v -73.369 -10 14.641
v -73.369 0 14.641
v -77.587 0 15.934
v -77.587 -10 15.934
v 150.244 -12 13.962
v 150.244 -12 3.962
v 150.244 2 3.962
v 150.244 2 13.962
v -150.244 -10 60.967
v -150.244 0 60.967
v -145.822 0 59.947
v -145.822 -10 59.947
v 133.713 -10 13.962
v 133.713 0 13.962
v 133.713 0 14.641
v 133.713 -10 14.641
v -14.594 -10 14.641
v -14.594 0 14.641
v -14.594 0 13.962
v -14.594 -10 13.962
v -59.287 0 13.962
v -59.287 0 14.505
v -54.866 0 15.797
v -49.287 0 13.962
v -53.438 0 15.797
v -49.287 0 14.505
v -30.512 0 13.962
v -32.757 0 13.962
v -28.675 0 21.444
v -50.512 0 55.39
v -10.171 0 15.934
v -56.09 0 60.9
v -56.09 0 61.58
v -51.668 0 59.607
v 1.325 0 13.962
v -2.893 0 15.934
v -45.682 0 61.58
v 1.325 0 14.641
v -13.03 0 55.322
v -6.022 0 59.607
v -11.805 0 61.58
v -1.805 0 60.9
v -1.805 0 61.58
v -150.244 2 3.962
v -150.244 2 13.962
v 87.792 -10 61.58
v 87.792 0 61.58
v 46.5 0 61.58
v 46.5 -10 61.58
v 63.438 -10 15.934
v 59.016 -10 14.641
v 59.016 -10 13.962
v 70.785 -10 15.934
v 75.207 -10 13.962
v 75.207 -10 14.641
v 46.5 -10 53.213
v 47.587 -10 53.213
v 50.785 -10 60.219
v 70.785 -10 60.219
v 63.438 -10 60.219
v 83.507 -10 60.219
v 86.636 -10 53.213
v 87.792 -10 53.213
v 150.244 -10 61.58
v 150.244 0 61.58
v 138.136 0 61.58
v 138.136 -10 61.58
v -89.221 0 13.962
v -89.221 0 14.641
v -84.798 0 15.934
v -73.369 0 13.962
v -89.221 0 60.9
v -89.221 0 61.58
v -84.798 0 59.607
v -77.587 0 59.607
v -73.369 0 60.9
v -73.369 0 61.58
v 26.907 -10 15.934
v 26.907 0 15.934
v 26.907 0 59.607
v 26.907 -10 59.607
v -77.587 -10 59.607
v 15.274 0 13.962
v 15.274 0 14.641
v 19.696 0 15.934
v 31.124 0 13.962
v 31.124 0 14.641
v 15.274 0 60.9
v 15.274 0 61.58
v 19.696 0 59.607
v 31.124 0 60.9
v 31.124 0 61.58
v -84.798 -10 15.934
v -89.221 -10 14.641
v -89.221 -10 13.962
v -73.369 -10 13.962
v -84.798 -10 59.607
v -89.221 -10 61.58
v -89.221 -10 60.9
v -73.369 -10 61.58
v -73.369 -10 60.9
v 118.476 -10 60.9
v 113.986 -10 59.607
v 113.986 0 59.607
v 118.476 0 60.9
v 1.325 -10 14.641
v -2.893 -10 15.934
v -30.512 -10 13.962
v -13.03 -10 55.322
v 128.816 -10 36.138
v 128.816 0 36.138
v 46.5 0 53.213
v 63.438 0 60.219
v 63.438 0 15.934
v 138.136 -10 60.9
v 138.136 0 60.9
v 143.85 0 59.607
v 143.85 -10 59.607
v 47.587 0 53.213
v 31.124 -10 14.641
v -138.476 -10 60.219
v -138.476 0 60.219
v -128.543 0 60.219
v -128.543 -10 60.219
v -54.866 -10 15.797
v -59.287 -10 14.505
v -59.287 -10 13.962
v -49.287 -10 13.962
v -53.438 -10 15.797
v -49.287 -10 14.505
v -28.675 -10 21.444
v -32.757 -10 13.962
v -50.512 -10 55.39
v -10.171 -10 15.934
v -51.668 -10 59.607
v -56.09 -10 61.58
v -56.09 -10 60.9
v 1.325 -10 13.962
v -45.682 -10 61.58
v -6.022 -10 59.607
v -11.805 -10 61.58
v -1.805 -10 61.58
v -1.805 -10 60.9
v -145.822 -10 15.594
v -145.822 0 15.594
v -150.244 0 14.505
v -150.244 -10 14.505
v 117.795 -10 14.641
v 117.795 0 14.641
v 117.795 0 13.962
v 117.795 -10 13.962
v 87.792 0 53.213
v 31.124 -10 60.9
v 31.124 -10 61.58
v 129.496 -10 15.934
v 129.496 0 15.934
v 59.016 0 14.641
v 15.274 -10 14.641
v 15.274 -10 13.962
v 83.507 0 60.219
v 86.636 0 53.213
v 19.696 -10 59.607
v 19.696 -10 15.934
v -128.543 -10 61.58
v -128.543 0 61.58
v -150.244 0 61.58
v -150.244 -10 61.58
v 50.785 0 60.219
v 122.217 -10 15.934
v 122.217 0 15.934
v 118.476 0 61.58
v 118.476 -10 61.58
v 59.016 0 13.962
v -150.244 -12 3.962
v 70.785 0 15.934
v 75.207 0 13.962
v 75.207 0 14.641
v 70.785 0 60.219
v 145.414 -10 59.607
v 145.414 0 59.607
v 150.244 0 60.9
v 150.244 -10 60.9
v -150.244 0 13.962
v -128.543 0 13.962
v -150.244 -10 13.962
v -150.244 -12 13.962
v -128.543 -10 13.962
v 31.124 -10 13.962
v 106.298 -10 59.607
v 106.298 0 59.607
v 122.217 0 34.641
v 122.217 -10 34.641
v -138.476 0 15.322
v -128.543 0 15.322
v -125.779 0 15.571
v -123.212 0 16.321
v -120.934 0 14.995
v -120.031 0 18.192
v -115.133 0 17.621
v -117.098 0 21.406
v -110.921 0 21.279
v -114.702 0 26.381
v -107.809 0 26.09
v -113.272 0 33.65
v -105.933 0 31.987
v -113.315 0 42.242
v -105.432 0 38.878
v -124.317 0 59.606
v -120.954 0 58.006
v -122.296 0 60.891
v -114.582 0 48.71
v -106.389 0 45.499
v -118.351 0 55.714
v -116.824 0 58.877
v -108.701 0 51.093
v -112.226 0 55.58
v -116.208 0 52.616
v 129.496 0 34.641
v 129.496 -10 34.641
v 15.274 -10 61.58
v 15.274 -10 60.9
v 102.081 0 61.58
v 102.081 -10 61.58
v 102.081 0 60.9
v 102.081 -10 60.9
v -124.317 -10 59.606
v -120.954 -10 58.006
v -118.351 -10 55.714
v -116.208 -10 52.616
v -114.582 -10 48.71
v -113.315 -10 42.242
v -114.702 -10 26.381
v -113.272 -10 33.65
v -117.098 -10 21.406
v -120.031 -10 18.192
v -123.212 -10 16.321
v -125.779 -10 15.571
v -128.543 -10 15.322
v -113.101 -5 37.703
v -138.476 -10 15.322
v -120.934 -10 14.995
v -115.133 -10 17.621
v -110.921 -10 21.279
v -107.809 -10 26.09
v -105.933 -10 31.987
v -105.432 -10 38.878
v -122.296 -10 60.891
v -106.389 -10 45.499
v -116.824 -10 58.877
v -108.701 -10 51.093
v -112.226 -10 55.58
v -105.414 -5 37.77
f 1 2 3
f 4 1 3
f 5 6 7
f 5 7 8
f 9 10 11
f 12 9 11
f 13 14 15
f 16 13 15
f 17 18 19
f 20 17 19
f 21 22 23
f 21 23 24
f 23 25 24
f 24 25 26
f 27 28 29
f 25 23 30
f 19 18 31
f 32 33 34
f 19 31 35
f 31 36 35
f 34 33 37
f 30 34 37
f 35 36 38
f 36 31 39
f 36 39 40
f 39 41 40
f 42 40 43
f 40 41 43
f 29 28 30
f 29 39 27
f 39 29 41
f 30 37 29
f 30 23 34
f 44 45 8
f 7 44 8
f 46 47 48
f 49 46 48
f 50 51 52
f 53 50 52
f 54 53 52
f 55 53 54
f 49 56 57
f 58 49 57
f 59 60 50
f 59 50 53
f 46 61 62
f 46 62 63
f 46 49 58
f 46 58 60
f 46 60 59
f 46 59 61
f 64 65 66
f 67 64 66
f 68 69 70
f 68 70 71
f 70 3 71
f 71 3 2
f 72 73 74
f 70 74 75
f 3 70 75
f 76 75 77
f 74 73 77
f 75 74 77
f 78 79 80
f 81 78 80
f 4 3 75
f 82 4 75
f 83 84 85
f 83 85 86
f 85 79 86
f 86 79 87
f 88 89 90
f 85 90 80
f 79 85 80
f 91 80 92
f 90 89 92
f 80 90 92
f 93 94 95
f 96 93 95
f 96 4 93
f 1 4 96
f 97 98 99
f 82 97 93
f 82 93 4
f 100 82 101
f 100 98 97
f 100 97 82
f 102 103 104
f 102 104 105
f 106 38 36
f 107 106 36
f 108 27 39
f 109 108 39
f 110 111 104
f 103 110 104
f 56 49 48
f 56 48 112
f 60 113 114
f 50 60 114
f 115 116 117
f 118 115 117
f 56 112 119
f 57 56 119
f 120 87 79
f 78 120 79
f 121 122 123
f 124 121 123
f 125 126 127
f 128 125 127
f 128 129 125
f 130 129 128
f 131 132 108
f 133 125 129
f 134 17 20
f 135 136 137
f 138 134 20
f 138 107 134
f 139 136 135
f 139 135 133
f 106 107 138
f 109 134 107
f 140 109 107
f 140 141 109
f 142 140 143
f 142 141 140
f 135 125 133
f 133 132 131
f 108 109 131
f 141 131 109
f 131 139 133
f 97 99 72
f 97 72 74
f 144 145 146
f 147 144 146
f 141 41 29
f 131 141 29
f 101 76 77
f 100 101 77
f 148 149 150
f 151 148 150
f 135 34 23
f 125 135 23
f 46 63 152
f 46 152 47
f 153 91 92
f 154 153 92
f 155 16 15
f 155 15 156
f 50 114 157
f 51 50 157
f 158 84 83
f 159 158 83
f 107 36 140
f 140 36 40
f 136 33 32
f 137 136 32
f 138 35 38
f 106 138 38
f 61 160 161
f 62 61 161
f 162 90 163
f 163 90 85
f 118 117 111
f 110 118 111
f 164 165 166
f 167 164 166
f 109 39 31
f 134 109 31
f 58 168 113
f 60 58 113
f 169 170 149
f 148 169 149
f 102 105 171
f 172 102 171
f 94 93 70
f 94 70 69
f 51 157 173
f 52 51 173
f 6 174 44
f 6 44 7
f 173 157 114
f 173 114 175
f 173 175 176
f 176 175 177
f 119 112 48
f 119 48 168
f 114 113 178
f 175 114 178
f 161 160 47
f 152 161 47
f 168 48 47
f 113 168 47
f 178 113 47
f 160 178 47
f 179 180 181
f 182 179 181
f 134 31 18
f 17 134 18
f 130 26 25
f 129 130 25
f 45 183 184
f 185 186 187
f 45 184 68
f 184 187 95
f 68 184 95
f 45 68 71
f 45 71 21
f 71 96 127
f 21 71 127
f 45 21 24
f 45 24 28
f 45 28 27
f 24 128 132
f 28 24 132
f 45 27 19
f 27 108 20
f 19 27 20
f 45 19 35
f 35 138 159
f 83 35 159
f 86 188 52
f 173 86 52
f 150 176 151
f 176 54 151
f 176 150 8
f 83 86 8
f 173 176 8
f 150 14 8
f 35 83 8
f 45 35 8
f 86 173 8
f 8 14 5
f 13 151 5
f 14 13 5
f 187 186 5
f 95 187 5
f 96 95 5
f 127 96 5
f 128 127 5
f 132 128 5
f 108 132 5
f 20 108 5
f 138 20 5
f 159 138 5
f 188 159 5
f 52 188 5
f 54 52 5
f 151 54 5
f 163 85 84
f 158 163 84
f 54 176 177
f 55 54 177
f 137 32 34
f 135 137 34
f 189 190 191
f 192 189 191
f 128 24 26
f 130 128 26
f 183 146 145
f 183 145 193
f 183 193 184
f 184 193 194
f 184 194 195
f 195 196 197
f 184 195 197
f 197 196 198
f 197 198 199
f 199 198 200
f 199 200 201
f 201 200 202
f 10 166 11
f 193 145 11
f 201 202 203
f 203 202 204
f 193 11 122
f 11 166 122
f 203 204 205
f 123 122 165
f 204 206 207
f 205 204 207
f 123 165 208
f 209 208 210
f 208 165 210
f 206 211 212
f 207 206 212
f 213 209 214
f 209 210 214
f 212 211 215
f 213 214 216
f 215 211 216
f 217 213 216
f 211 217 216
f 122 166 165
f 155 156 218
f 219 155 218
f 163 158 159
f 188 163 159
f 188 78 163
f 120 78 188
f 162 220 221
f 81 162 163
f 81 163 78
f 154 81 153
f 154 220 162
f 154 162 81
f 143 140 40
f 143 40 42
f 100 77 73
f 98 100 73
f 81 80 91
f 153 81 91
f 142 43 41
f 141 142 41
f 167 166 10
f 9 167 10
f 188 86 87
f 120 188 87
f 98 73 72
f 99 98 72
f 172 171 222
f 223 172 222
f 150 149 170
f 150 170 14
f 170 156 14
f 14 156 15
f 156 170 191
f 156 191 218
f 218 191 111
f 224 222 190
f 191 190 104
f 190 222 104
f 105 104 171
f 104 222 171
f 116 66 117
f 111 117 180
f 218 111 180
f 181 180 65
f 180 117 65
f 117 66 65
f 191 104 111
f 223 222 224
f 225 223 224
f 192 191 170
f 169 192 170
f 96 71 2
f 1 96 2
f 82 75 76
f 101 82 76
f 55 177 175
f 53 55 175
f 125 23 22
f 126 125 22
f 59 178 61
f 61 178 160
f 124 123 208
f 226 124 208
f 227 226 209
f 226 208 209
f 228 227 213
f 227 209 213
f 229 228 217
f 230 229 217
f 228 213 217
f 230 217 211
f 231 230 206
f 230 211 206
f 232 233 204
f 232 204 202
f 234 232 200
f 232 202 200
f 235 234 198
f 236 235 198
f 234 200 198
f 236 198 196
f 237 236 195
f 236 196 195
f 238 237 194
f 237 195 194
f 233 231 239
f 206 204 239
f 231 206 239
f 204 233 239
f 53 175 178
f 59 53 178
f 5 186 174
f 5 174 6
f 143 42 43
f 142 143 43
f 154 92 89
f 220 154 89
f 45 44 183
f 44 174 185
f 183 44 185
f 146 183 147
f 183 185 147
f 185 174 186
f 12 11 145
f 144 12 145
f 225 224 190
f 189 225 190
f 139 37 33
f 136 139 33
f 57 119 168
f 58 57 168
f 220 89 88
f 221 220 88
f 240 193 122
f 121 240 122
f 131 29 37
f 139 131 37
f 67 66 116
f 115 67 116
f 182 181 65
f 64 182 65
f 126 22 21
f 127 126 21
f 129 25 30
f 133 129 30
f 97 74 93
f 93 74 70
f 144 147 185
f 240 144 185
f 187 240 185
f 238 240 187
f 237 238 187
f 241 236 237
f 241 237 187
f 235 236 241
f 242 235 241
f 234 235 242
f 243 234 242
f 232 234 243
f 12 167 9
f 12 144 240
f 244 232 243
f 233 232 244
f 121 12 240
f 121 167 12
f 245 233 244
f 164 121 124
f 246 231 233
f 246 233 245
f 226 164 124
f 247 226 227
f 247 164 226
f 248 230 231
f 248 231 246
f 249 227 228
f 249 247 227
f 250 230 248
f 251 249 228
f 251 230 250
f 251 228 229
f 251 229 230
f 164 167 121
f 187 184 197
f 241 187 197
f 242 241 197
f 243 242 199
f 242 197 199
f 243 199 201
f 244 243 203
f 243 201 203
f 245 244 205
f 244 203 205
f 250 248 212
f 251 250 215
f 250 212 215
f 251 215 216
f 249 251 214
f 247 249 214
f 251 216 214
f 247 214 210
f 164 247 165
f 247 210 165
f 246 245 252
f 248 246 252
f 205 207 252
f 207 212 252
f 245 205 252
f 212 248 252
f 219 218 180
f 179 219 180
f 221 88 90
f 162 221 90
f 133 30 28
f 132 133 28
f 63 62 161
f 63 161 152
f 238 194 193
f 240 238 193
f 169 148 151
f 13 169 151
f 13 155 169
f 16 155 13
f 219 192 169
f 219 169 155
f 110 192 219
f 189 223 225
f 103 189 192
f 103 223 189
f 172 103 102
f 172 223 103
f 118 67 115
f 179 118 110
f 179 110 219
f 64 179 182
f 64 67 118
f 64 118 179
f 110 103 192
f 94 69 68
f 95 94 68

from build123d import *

# Parameters (mm, degrees)
F1_DEPTH      = 10
F2_W          = 300.4877288307
F2_H          = 10
F3_DEPTH      = 12
F3_DEPTH_BACK = 2


with BuildPart() as f1:
    # F0 (on Front) → F1 (new body)
    with BuildSketch(Plane.XZ):
        with BuildLine():
            Line((-128.5430908417, 61.5803188143), (-150.2438644154, 61.5803188143))
            Line((-150.2438644154, 61.5803188143), (-150.2438644154, 60.9673641131))
            Line((-150.2438644154, 60.9673641131), (-145.822049572, 59.9470982195))
            Line((-145.822049572, 59.9470982195), (-145.822049572, 15.5938366192))
            Line((-145.822049572, 15.5938366192), (-150.2438644154, 14.5050264939))
            Line((-150.2438644154, 14.5050264939), (-150.2438644154, 13.961612684))
            Line((-150.2438644154, 13.961612684), (-128.5430908417, 13.961612684))
            add(Edge.make_bspline(
                [(-128.5430908417, 13.961612684), (-114.9375294447, 13.961612684), (-105.4137507313, 22.8042871634), (-105.4137507313, 37.7704674193)],
                knots=[0, 0, 0, 0, 1, 1, 1, 1], degree=3))
            add(Edge.make_bspline(
                [(-105.4137507313, 37.7704674193), (-105.4137507313, 52.6005865102), (-114.9375294447, 61.5803188143), (-128.5430908417, 61.5803188143)],
                knots=[0, 0, 0, 0, 1, 1, 1, 1], degree=3))
        make_face()
        with BuildLine():
            Line((-138.4755378628, 15.3216367913), (-138.4755378628, 60.2193034542))
            Line((-138.4755378628, 60.2193034542), (-128.5430908417, 60.2193034542))
            add(Edge.make_bspline(
                [(-128.5430908417, 60.2193034542), (-119.5629998843, 60.2193034542), (-113.1010137092, 52.7364908771), (-113.1010137092, 37.7029144405)],
                knots=[0, 0, 0, 0, 1, 1, 1, 1], degree=3))
            add(Edge.make_bspline(
                [(-113.1010137092, 37.7029144405), (-113.1010137092, 22.7367341846), (-119.5629998843, 15.3216367913), (-128.5430908417, 15.3216367913)],
                knots=[0, 0, 0, 0, 1, 1, 1, 1], degree=3))
            Line((-128.5430908417, 15.3216367913), (-138.4755378628, 15.3216367913))
        make_face(mode=Mode.SUBTRACT)
    extrude(amount=F1_DEPTH)



with BuildPart() as f1b:
    # F0 (on Front) → F1, piece 2 (new body)
    with BuildSketch(Plane.XZ):
        Polygon((-73.3692503281, 61.5803188143), (-89.2206283678, 61.5803188143), (-89.2206283678, 60.8998111343), (-84.7978204693, 59.6073400059), (-84.7978204693, 15.9335948328), (-89.2206283678, 14.6411291112), (-89.2206283678, 13.961612684), (-73.3692503281, 13.961612684), (-73.3692503281, 14.6411291112), (-77.5874059707, 15.9335948328), (-77.5874059707, 59.6073400059), (-73.3692503281, 60.8998111343), align=None)
    extrude(amount=F1_DEPTH)


with BuildPart() as f1c:
    # F0 (on Front) → F1, piece 3 (new body)
    with BuildSketch(Plane.XZ):
        Polygon((-45.6819891524, 61.5803188143), (-56.0902915977, 61.5803188143), (-56.0902915977, 60.8998111343), (-51.6684767544, 59.6073400059), (-54.8663701079, 15.7974922154), (-59.2871936984, 14.5050264939), (-59.2871936984, 13.961612684), (-49.2871936984, 13.961612684), (-49.2871936984, 14.5050264939), (-53.4377999666, 15.7974922154), (-50.5121118479, 55.3901756161), (-32.7572976934, 13.961612684), (-30.5121118479, 13.961612684), (-13.0295029282, 55.3216259776), (-10.1713677883, 15.9335948328), (-14.5941738845, 14.6411291112), (-14.5941738845, 13.961612684), (1.3247553318, 13.961612684), (1.3247553318, 14.6411291112), (-2.8934057176, 15.9335948328), (-6.0217563775, 59.6073400059), (-1.8045883832, 60.8998111343), (-1.8045883832, 61.5803188143), (-11.8045883832, 61.5803188143), (-28.6752410637, 21.4442270106), align=None)
    extrude(amount=F1_DEPTH)


with BuildPart() as f1d:
    # F0 (on Front) → F1, piece 4 (new body)
    with BuildSketch(Plane.XZ):
        Polygon((31.1240752963, 61.5803188143), (15.2736903117, 61.5803188143), (15.2736903117, 60.8998111343), (19.6955051551, 59.6073400059), (19.6955051551, 15.9335948328), (15.2736903117, 14.6411291112), (15.2736903117, 13.961612684), (31.1240752963, 13.961612684), (31.1240752963, 14.6411291112), (26.9069127088, 15.9335948328), (26.9069127088, 59.6073400059), (31.1240752963, 60.8998111343), align=None)
    extrude(amount=F1_DEPTH)


with BuildPart() as f1e:
    # F0 (on Front) → F1, piece 5 (new body)
    with BuildSketch(Plane.XZ):
        Polygon((87.7920582266, 61.5803188143), (46.4995961095, 61.5803188143), (46.4995961095, 53.2125499586), (47.587414982, 53.2125499586), (50.7853083355, 60.2193034542), (63.4377999666, 60.2193034542), (63.4377999666, 15.9335948328), (59.0159851233, 14.6411291112), (59.0159851233, 13.961612684), (75.2071195743, 13.961612684), (75.2071195743, 14.6411291112), (70.7853047309, 15.9335948328), (70.7853047309, 60.2193034542), (83.5073372534, 60.2193034542), (86.6356897155, 53.2125499586), (87.7920582266, 53.2125499586), align=None)
    extrude(amount=F1_DEPTH)


with BuildPart() as f1f:
    # F0 (on Front) → F1, piece 6 (new body)
    with BuildSketch(Plane.XZ):
        Polygon((118.4755414673, 61.5803188143), (102.0807460133, 61.5803188143), (102.0807460133, 60.8998111343), (106.2979140076, 59.6073400059), (122.2168450261, 34.6411237044), (122.2168450261, 15.9335948328), (117.7950337873, 14.6411291112), (117.7950337873, 13.961612684), (133.7129717507, 13.961612684), (133.7129717507, 14.6411291112), (129.4958037565, 15.9335948328), (129.4958037565, 34.6411237044), (145.4137417199, 59.6073400059), (150.2438644154, 60.8998111343), (150.2438644154, 61.5803188143), (138.1357796492, 61.5803188143), (138.1357796492, 60.8998111343), (143.8500602141, 59.6073400059), (128.8162873292, 36.1382416819), (113.9861682383, 59.6073400059), (118.4755414673, 60.8998111343), align=None)
    extrude(amount=F1_DEPTH)


with BuildPart() as f1_1:
    add(f1.part)

    add(f1b.part)  # F3 merges F1b

    add(f1c.part)  # F3 merges F1c

    add(f1d.part)  # F3 merges F1d

    add(f1e.part)  # F3 merges F1e

    add(f1f.part)  # F3 merges F1f
    # F2 (on Front) → F3 (join, two sides)
    with BuildSketch(Plane.XZ) as f3_sk:
        with Locations((0, 8.961612684)):
            Rectangle(F2_W, F2_H)
    extrude(amount=F3_DEPTH)
    extrude(f3_sk.sketch, amount=-F3_DEPTH_BACK)


solid = f1_1.part
